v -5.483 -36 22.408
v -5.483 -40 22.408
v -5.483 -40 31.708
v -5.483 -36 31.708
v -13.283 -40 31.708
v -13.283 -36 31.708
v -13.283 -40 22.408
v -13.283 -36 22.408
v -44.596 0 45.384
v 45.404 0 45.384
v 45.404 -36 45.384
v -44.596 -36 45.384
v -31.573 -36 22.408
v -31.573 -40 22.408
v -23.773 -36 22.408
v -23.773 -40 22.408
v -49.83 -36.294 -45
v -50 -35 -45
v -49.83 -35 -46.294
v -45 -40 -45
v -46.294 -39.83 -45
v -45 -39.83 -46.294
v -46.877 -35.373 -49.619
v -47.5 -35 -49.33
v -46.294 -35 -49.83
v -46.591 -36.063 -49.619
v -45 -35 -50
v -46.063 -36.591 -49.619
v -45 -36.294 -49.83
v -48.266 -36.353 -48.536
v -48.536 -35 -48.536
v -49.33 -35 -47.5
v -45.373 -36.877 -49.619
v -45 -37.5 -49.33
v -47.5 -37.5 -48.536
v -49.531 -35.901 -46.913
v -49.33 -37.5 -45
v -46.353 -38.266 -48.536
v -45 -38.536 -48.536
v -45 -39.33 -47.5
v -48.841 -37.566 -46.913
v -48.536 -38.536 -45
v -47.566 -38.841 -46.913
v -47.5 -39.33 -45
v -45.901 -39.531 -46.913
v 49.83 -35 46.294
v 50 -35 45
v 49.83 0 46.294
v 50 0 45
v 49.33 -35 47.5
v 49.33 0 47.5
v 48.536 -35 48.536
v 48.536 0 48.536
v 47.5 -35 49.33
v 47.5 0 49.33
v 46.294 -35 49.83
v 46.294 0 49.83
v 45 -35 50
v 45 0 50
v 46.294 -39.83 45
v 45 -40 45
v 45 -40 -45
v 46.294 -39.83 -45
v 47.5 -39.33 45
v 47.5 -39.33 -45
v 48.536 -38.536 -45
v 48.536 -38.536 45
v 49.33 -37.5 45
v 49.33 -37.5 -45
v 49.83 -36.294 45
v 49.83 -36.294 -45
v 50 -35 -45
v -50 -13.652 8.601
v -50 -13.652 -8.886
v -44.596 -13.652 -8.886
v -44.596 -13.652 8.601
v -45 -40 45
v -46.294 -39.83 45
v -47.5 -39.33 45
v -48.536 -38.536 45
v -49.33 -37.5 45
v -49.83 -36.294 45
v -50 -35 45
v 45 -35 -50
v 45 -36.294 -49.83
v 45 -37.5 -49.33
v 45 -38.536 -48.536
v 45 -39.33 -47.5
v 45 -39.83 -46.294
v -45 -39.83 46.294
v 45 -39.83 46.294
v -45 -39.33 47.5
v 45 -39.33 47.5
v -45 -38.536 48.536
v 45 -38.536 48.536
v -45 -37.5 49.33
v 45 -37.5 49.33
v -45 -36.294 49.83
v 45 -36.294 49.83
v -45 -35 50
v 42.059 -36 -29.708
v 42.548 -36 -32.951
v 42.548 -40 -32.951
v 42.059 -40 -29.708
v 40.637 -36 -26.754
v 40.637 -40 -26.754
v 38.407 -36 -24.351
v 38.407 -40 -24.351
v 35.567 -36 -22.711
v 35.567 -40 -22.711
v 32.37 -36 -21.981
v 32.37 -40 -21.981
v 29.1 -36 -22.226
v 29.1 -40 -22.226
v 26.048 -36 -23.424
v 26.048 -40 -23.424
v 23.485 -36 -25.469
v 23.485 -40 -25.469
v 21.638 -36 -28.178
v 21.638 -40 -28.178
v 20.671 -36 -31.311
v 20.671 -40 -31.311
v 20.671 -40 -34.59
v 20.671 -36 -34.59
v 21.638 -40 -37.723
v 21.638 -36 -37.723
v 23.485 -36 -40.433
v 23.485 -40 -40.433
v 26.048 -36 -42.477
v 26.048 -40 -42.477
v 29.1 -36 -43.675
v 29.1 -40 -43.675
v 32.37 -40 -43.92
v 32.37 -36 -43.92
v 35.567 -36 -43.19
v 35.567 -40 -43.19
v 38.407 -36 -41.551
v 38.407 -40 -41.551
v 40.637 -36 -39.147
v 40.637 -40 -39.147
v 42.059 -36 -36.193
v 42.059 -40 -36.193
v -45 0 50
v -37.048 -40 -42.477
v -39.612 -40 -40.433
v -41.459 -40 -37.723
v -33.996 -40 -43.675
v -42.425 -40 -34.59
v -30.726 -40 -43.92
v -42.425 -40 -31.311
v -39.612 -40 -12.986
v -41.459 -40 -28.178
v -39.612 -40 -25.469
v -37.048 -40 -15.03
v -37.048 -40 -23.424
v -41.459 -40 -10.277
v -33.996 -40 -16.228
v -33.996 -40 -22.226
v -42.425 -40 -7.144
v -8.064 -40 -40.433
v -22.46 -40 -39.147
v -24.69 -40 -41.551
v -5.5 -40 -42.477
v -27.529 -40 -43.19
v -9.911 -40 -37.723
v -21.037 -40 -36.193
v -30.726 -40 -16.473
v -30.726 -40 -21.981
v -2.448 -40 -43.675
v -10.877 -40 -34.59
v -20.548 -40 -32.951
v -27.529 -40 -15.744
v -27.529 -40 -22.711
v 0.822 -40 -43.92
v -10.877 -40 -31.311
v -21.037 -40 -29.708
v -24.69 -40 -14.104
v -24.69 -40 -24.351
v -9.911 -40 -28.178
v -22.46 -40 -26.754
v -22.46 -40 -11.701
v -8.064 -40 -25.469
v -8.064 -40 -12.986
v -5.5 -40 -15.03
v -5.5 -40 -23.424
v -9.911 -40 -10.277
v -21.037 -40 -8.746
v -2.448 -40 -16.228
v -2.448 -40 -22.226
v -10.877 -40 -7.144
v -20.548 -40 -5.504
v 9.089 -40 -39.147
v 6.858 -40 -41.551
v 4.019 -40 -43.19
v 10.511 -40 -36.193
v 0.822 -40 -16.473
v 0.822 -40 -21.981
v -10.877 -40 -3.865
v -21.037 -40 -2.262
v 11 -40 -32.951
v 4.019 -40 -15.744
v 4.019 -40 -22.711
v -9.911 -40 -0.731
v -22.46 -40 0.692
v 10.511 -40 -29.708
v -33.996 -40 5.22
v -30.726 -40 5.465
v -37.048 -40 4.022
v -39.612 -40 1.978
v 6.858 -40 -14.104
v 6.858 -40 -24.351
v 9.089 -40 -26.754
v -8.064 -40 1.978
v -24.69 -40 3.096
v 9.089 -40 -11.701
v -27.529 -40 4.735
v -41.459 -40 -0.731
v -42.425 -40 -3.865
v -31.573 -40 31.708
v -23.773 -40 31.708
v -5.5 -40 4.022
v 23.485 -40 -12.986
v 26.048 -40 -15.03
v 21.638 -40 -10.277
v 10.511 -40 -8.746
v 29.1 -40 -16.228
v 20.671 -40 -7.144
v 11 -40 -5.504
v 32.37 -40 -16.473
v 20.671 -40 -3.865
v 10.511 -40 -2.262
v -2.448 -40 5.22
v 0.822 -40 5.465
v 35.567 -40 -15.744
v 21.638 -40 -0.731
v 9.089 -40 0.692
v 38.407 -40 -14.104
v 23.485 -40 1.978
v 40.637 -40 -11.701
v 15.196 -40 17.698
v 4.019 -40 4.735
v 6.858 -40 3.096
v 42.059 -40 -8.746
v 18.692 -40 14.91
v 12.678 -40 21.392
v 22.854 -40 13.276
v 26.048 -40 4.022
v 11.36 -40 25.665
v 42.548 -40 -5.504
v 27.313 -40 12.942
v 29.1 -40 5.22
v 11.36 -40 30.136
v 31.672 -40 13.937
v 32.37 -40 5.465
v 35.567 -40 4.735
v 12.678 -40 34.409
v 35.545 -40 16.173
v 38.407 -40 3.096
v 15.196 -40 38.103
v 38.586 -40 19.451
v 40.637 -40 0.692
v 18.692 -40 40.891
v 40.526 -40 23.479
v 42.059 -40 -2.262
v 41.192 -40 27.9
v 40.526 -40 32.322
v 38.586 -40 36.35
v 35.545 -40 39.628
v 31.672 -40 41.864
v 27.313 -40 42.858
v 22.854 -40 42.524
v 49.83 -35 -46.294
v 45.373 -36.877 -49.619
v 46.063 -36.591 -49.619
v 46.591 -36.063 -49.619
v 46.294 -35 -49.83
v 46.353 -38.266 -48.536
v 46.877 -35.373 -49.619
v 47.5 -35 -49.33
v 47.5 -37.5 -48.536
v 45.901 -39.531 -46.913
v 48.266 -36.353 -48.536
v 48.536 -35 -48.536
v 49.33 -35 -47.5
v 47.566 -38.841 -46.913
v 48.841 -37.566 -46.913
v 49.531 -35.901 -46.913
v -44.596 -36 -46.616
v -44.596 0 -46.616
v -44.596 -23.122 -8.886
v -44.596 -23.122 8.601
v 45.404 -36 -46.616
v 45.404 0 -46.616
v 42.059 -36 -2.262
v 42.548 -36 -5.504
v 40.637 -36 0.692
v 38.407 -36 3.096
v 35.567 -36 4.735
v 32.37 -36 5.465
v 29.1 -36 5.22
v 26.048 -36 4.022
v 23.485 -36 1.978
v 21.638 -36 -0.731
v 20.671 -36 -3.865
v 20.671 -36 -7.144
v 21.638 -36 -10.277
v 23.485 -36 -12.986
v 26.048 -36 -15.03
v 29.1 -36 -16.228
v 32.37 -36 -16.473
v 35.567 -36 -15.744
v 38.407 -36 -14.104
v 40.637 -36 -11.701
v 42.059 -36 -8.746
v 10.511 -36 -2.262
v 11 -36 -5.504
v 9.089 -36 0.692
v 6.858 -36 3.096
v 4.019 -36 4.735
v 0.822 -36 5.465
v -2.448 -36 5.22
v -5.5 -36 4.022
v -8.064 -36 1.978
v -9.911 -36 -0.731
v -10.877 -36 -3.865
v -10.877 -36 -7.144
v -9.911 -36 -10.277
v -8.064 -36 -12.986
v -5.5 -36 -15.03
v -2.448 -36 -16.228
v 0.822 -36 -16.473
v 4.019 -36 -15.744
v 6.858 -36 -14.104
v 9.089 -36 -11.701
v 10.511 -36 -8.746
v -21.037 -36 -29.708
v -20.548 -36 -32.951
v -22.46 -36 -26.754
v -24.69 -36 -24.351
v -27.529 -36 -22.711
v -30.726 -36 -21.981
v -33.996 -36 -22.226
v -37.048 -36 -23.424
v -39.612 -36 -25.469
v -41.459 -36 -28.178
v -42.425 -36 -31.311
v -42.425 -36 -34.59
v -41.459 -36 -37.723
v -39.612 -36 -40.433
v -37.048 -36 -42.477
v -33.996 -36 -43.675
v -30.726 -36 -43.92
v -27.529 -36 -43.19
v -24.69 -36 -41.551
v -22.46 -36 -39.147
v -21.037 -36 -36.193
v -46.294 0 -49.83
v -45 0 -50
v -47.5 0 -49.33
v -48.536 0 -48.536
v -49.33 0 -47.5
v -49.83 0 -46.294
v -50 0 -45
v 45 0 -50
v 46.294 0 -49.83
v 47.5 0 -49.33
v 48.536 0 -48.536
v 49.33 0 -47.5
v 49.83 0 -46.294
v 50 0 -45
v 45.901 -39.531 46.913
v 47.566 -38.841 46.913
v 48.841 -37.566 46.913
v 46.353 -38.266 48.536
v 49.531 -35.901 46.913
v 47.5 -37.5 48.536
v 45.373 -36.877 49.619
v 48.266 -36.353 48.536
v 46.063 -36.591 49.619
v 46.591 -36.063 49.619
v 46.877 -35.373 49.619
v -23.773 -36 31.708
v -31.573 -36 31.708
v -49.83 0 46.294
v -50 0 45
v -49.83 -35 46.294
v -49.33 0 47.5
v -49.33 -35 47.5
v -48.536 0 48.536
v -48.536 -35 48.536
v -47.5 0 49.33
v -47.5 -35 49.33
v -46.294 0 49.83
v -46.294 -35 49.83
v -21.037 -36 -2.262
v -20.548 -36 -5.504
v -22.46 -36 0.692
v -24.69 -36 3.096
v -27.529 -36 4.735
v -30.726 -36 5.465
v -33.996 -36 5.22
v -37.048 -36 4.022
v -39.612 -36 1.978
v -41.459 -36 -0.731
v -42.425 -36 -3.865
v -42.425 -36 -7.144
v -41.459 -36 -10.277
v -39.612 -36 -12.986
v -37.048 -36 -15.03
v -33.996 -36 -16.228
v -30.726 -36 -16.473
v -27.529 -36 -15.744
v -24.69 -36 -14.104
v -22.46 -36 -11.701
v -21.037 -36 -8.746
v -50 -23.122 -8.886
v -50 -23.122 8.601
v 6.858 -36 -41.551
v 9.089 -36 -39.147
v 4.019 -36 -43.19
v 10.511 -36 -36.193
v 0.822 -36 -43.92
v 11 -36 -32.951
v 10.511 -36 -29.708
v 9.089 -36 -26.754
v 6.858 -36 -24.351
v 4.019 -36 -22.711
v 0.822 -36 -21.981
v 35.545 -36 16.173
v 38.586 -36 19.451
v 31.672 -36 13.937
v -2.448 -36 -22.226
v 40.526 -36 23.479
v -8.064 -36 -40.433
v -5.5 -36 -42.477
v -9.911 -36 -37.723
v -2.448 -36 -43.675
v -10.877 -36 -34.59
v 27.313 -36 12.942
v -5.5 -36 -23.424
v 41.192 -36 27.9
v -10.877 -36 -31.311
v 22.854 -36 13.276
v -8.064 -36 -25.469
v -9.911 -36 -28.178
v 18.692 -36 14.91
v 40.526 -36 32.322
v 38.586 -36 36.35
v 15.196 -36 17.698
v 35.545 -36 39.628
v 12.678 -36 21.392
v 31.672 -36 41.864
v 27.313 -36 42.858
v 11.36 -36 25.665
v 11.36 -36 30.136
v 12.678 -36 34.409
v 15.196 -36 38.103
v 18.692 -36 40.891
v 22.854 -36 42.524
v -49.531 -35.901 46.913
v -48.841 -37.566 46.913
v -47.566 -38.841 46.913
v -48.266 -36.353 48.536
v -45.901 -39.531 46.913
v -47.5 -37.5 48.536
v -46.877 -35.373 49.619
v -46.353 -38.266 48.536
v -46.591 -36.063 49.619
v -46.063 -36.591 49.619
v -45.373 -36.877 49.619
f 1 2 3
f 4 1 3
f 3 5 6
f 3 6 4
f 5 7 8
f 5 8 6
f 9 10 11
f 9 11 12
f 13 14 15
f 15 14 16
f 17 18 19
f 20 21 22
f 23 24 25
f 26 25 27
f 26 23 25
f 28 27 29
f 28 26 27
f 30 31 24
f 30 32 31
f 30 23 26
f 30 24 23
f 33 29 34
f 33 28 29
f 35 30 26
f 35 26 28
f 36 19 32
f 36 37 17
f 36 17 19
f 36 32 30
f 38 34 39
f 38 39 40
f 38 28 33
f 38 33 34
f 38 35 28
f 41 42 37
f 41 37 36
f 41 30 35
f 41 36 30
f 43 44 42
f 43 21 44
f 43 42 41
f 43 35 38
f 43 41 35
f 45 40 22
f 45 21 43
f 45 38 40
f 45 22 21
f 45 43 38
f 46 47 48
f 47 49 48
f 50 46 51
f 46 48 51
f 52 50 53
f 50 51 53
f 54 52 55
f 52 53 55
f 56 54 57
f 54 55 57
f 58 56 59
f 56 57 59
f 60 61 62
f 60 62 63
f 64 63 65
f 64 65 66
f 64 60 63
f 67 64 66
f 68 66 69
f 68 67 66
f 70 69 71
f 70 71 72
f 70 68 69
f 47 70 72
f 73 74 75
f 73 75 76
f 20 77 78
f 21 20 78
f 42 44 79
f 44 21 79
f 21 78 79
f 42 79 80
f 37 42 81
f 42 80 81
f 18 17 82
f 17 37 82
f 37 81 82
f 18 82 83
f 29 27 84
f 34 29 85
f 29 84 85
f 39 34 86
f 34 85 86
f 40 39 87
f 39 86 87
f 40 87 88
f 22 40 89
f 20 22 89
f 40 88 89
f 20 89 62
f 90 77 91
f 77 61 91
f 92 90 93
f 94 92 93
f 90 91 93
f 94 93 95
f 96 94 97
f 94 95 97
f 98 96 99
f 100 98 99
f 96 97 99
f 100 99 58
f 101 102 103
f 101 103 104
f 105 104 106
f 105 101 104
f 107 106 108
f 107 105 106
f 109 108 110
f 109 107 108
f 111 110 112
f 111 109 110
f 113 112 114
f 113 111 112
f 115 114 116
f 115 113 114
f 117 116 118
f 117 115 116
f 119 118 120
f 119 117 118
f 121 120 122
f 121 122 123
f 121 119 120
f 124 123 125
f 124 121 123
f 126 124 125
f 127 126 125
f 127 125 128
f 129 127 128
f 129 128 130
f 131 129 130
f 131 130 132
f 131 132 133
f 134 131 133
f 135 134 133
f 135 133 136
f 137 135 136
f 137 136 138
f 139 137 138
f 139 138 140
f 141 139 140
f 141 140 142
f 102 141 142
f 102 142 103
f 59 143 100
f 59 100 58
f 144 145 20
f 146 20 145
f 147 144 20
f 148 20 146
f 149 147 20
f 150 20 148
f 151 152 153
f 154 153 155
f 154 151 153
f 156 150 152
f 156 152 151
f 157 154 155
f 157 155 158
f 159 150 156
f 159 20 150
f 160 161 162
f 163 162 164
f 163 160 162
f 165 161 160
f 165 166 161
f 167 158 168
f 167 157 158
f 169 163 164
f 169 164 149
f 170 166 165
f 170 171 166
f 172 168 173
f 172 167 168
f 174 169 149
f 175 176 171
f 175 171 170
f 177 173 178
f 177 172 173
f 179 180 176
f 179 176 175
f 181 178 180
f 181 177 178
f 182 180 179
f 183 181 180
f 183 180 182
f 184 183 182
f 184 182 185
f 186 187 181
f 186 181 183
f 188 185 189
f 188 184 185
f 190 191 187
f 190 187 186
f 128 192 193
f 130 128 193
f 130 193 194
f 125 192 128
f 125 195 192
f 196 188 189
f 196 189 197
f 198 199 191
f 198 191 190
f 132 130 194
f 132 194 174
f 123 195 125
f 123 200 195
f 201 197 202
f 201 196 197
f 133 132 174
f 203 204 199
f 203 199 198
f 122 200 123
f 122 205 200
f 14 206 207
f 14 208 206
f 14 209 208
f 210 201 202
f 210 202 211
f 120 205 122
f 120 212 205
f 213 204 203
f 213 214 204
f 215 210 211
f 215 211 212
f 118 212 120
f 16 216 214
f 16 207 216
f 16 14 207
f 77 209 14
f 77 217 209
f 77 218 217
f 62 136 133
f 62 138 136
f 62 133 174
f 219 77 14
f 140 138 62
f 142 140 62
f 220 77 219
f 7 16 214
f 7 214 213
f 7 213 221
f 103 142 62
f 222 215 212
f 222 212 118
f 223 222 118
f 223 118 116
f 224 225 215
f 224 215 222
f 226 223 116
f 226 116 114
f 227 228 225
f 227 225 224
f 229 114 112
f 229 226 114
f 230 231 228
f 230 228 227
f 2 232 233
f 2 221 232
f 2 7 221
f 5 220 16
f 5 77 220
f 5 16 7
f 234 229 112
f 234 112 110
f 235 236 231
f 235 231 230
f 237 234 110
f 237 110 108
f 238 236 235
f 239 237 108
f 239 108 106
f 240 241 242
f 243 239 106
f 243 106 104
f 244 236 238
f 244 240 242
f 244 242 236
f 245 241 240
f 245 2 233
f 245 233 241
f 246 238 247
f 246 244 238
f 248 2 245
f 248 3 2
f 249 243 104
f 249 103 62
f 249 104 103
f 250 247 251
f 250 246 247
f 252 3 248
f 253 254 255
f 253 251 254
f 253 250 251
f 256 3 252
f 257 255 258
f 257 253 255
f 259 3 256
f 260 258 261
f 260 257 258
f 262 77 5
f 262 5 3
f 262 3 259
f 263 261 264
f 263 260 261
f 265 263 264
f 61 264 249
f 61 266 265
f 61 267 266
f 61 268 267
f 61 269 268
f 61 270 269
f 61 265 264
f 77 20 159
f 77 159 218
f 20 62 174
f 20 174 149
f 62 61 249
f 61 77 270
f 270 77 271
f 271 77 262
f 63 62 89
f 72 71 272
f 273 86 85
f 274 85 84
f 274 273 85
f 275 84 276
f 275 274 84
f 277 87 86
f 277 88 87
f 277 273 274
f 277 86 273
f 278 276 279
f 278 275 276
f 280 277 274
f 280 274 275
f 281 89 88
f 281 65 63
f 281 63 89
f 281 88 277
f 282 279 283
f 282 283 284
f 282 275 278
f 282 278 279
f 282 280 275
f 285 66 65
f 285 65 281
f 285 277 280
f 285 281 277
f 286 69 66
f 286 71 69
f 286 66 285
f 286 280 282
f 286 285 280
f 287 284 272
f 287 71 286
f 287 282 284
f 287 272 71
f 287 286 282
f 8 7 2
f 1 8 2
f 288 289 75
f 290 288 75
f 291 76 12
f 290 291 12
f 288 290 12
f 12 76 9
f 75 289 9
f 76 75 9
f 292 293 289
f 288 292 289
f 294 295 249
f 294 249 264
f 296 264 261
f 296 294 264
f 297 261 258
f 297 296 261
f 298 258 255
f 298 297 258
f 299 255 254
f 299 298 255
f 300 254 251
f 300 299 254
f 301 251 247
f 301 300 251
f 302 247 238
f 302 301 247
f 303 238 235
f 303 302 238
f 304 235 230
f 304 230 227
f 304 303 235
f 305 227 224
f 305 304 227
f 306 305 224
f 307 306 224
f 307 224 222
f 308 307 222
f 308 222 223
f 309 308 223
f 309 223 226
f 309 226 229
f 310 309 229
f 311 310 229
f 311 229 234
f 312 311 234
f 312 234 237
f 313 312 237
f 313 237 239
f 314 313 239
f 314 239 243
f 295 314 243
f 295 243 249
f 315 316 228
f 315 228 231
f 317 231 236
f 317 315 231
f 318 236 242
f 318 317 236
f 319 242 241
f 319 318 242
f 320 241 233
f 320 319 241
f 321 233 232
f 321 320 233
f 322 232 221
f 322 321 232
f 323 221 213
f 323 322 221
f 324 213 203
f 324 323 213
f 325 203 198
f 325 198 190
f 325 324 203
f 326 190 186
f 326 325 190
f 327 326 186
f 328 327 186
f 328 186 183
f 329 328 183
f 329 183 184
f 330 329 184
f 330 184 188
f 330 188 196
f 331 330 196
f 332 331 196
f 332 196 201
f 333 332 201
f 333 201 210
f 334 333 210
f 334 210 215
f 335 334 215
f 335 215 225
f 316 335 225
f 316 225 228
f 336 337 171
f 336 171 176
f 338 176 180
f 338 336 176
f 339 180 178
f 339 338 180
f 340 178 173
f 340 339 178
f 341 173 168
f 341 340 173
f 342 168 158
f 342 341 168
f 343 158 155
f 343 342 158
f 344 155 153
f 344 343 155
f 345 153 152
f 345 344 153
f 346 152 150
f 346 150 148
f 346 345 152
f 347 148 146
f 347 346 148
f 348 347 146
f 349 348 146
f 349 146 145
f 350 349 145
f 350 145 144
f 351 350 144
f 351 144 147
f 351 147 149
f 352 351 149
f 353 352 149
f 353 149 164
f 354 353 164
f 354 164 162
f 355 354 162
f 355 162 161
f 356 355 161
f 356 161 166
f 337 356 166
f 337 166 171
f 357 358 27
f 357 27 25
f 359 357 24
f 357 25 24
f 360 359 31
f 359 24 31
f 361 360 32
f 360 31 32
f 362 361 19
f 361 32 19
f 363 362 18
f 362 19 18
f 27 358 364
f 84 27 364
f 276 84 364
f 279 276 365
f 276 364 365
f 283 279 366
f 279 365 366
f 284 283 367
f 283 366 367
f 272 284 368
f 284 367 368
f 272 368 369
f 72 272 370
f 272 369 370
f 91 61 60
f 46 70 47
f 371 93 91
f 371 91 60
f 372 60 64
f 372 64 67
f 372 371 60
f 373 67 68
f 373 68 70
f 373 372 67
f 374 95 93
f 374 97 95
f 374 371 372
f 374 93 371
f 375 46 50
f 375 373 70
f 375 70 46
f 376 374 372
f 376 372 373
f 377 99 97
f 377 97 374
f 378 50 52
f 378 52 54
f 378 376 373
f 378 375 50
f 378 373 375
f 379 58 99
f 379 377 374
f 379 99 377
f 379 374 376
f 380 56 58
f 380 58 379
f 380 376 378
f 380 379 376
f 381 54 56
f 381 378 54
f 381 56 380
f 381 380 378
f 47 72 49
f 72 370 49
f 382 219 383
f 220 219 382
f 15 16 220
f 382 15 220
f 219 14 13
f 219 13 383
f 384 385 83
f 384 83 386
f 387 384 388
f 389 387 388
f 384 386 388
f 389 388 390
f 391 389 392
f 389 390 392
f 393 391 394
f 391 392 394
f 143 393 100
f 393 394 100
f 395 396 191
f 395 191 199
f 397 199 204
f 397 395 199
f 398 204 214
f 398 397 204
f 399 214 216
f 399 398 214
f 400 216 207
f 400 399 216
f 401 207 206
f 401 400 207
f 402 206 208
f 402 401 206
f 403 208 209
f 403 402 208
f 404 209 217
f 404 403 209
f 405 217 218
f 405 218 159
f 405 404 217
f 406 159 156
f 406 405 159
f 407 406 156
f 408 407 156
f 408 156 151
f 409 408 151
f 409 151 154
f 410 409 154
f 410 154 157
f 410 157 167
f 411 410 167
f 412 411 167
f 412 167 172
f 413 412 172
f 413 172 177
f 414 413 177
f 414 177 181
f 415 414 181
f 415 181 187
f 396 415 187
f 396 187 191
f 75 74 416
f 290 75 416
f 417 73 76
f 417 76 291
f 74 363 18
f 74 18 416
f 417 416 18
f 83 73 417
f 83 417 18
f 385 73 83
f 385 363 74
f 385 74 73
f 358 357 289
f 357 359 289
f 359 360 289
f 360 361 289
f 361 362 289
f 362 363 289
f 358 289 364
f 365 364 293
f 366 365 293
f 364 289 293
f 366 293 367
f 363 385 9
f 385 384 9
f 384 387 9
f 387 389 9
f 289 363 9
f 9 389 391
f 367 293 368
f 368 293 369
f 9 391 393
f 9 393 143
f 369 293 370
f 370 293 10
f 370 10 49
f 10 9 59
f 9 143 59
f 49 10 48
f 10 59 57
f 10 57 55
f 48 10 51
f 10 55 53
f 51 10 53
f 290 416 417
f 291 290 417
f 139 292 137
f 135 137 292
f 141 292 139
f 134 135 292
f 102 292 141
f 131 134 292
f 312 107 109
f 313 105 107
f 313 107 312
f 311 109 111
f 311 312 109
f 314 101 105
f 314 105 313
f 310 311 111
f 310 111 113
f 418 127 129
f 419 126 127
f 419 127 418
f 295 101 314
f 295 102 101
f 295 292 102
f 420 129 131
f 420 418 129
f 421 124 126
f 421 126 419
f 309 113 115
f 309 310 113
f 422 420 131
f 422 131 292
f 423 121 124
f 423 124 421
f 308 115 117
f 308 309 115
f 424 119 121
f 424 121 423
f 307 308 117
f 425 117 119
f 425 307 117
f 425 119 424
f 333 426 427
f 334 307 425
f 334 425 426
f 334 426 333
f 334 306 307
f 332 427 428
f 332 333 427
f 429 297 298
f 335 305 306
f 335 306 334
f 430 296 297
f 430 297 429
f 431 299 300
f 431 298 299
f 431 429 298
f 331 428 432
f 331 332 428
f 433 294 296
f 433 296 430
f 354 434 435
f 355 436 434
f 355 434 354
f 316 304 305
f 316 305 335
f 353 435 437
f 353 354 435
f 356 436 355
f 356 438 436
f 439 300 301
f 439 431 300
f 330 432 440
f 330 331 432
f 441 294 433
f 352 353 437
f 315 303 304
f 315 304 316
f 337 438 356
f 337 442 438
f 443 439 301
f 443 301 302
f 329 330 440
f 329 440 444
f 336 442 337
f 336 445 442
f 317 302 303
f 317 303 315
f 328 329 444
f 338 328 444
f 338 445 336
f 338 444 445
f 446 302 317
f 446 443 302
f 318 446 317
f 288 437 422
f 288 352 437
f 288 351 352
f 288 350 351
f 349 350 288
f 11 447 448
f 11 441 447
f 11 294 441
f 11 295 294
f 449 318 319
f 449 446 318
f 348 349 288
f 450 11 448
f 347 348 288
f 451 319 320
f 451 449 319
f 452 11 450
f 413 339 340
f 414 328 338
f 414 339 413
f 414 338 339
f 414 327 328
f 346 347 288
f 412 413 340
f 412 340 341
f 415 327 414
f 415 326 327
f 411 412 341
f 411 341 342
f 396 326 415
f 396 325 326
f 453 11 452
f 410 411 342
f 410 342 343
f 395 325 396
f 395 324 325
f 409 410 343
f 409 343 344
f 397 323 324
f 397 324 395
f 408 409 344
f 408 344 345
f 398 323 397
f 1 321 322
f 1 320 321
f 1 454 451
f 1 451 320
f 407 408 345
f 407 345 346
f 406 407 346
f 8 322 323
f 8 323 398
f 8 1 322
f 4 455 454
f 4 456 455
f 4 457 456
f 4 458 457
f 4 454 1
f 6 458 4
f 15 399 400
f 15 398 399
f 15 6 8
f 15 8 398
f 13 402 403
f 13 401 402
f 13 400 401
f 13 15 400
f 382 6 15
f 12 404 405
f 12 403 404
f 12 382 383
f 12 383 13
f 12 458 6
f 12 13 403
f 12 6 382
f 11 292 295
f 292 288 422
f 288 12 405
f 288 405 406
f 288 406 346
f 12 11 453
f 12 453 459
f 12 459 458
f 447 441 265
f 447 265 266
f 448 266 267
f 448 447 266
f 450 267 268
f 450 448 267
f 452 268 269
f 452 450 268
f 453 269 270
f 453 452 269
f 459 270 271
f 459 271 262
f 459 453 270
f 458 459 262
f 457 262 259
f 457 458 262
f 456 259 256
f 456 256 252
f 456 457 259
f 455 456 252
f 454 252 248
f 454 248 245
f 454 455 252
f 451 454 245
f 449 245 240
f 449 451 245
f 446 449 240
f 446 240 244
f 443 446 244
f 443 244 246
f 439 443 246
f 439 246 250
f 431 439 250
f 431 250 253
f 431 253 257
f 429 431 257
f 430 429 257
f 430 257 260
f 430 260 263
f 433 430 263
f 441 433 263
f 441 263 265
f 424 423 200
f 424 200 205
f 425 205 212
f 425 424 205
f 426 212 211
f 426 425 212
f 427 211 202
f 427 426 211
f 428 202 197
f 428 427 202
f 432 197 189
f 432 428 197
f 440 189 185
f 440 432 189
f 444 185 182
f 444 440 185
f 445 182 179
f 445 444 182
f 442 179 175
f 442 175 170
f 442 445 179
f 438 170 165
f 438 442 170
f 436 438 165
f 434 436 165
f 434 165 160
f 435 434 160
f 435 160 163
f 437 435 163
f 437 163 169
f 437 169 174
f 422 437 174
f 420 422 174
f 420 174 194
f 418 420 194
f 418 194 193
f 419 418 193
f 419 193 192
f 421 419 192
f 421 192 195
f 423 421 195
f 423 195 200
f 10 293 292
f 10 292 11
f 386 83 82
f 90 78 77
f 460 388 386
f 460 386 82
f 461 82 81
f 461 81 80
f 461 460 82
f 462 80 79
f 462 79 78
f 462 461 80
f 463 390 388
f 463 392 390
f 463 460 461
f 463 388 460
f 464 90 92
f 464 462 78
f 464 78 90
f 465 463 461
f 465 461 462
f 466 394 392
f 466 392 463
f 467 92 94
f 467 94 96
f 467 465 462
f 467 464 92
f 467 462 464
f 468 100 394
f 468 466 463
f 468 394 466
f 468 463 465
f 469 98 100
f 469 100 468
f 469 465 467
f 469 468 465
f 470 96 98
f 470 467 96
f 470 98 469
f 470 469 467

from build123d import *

# Parameters (mm, degrees)
F0_W      = 100
F0_H      = 100
F0_R      = 11
F0_R_2    = 15
F1_DEPTH  = 40
F2_W      = 89.999996
F2_H      = 92
F3_DEPTH  = 36
F4_W      = 7.8
F4_H      = 9.3
F5_DEPTH  = 25
F6_R      = 5
F7_R      = 5
F8_R      = 5
F9_W      = 9.469847
F9_H      = 17.487352
F10_DEPTH = 25


with BuildPart() as f1:
    # F0 (on Front) → F1 (new body)
    with BuildSketch(Plane.XZ):
        Rectangle(F0_W, F0_H)
        with Locations((-31.548171, -32.950651)):
            Circle(F0_R, mode=Mode.SUBTRACT)
        with Locations((-31.548173, -5.504166)):
            Circle(F0_R, mode=Mode.SUBTRACT)
        with Locations((-3e-06, -5.504166)):
            Circle(F0_R, mode=Mode.SUBTRACT)
        with Locations((0, -32.950651)):
            Circle(F0_R, mode=Mode.SUBTRACT)
        with Locations((31.548171, -32.950651)):
            Circle(F0_R, mode=Mode.SUBTRACT)
        with Locations((31.548168, -5.504166)):
            Circle(F0_R, mode=Mode.SUBTRACT)
        with Locations((26.192216, 27.900403)):
            Circle(F0_R_2, mode=Mode.SUBTRACT)
    extrude(amount=F1_DEPTH)

    # F2 (on face) → F3 (cut)
    with BuildSketch(Plane(origin=(0, 0, 0), x_dir=(-1, 0, 0), z_dir=(0, 1, 0))):
        with Locations((-0.403937, -0.61572)):
            Rectangle(F2_W, F2_H)
    extrude(amount=-F3_DEPTH, mode=Mode.SUBTRACT)

    # F4 (on face) → F5 (cut)
    with BuildSketch(Plane.XZ.offset(40)):
        with Locations((-9.38255, 27.058275)):
            Rectangle(F4_W, F4_H)
        with Locations((-27.672551, 27.058275)):
            Rectangle(F4_W, F4_H)
    extrude(amount=-F5_DEPTH, mode=Mode.SUBTRACT)

    # F6
    f6_edges = [f1.edges().sort_by_distance(p)[0] for p in [
        (50, -40, 0),
    ]]
    fillet(f6_edges, radius=F6_R)

    # F7
    f7_edges = [f1.edges().sort_by_distance(p)[0] for p in [
        (-50, -40, 0),
    ]]
    fillet(f7_edges, radius=F7_R)

    # F8
    f8_edges = [f1.edges().sort_by_distance(p)[0] for p in [
        (0, -40, -50),
        (0, -40, 50),
    ]]
    fillet(f8_edges, radius=F8_R)

    # F9 (on face) → F10 (cut)
    with BuildSketch(Plane(origin=(-50, 0, 0), x_dir=(0, -1, 0), z_dir=(-1, 0, 0))):
        with Locations((18.386893, -0.142781)):
            Rectangle(F9_W, F9_H)
    extrude(amount=-F10_DEPTH, mode=Mode.SUBTRACT)


solid = f1.part
